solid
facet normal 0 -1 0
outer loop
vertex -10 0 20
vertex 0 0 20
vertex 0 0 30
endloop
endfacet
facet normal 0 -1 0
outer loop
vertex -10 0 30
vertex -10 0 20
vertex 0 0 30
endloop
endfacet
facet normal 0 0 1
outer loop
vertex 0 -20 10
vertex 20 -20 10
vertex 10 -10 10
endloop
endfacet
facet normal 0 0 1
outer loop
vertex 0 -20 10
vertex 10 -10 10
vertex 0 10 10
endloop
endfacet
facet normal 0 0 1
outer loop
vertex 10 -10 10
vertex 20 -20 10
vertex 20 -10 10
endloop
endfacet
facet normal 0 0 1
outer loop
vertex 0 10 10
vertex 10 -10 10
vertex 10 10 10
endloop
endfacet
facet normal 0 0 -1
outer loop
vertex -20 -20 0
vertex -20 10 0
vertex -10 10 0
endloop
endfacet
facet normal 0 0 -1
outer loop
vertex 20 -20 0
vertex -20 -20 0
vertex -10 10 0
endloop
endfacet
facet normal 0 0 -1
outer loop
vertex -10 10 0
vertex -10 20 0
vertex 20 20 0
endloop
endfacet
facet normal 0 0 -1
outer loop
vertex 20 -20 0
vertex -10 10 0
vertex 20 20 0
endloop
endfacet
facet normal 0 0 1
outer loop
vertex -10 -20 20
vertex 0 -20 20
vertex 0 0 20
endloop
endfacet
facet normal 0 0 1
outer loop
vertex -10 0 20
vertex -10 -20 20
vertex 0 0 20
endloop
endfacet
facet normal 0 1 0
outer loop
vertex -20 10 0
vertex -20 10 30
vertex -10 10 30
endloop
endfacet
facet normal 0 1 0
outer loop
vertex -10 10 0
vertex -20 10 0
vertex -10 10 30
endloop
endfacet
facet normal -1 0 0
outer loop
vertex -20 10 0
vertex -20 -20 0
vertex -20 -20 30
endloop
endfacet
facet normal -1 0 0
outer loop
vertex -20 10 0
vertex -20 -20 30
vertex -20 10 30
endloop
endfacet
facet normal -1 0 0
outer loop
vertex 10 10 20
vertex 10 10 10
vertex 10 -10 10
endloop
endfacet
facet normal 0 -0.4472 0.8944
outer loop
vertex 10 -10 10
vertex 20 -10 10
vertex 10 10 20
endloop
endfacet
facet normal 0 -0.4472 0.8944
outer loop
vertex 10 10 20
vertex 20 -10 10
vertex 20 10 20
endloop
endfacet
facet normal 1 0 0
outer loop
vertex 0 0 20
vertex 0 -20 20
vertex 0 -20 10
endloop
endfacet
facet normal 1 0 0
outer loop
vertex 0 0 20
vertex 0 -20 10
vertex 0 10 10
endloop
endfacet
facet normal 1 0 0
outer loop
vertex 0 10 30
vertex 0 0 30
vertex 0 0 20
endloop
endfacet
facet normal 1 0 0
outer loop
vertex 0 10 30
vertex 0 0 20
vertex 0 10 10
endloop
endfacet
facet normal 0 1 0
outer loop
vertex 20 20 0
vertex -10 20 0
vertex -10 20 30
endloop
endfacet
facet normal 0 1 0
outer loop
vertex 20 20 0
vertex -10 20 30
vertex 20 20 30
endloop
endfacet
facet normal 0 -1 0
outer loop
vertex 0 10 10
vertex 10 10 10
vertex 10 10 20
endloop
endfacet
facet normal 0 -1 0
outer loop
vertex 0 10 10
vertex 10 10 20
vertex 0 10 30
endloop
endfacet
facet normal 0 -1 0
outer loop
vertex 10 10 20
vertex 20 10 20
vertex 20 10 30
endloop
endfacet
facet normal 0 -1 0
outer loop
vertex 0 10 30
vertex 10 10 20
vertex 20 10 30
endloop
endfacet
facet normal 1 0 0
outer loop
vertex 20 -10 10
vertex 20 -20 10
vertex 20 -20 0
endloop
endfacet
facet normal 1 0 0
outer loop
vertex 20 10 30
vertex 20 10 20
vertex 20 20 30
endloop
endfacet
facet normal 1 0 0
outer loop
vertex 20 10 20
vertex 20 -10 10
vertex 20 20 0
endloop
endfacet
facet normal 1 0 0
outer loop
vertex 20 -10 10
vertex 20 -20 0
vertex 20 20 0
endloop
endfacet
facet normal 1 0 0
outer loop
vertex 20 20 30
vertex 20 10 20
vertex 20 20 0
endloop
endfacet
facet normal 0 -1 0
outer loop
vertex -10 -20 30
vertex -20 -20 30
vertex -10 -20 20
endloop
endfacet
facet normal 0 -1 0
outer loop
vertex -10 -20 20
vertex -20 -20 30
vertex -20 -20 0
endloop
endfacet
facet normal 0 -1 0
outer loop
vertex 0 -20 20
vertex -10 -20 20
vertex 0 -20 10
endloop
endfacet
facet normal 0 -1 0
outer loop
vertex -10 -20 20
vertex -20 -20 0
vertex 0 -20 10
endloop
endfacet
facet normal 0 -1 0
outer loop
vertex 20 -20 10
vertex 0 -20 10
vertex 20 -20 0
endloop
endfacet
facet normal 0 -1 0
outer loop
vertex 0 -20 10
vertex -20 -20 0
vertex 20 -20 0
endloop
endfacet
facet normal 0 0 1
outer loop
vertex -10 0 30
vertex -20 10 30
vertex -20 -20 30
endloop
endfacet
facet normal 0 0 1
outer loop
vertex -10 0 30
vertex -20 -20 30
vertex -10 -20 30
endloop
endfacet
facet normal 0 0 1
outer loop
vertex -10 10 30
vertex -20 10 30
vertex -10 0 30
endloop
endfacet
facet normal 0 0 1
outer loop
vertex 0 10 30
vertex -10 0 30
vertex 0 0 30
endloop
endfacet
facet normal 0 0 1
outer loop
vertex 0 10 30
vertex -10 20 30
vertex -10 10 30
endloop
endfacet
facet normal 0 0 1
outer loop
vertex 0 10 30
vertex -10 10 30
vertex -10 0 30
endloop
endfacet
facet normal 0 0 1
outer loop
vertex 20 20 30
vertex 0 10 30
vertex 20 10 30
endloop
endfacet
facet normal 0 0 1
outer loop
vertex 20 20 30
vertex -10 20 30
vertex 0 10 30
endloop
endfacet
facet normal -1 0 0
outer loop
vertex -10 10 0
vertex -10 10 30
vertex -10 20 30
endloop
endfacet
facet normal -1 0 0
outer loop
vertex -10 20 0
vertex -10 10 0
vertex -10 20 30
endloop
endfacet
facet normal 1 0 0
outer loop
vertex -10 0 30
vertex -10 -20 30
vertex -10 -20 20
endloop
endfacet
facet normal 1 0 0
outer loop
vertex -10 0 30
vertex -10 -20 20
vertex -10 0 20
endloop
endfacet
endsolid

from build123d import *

# Parameters (mm, degrees)
F0_W     = 40
F0_H     = 40
F1_DEPTH = 30
F2_W     = 10
F2_H     = 10
F3_DEPTH = 40
F5_DEPTH = 20
F6_W     = 20
F6_H     = 10
F7_DEPTH = 10
F9_DEPTH = 30


with BuildPart() as f1:
    # F0 (on Top) → F1 (new body)
    with BuildSketch(Plane.XY):
        Rectangle(F0_W, F0_H)
    extrude(amount=F1_DEPTH)

    # F2 (on face) → F3 (cut)
    with BuildSketch(Plane.XY.offset(30)):
        with Locations((-15, 15)):
            Rectangle(F2_W, F2_H)
    extrude(amount=-F3_DEPTH, mode=Mode.SUBTRACT)

    # F4 (on face) → F5 (cut)
    with BuildSketch(Plane.YZ.offset(20)):
        Polygon((10, 30), (-20, 30), (-20, 10), (-10, 10), (10, 20), align=None)
    extrude(amount=-F5_DEPTH, mode=Mode.SUBTRACT)

    # F6 (on face) → F7 (cut)
    with BuildSketch(Plane.YZ):
        with Locations((-10, 25)):
            Rectangle(F6_W, F6_H)
    extrude(amount=-F7_DEPTH, mode=Mode.SUBTRACT)

    # F8 (on face) → F9 (cut)
    with BuildSketch(Plane.XZ.offset(20)):
        Polygon((10, 10), (10, 30), (0, 30), (0, 20), (0, 10), align=None)
    extrude(amount=-F9_DEPTH, mode=Mode.SUBTRACT)


solid = f1.part
